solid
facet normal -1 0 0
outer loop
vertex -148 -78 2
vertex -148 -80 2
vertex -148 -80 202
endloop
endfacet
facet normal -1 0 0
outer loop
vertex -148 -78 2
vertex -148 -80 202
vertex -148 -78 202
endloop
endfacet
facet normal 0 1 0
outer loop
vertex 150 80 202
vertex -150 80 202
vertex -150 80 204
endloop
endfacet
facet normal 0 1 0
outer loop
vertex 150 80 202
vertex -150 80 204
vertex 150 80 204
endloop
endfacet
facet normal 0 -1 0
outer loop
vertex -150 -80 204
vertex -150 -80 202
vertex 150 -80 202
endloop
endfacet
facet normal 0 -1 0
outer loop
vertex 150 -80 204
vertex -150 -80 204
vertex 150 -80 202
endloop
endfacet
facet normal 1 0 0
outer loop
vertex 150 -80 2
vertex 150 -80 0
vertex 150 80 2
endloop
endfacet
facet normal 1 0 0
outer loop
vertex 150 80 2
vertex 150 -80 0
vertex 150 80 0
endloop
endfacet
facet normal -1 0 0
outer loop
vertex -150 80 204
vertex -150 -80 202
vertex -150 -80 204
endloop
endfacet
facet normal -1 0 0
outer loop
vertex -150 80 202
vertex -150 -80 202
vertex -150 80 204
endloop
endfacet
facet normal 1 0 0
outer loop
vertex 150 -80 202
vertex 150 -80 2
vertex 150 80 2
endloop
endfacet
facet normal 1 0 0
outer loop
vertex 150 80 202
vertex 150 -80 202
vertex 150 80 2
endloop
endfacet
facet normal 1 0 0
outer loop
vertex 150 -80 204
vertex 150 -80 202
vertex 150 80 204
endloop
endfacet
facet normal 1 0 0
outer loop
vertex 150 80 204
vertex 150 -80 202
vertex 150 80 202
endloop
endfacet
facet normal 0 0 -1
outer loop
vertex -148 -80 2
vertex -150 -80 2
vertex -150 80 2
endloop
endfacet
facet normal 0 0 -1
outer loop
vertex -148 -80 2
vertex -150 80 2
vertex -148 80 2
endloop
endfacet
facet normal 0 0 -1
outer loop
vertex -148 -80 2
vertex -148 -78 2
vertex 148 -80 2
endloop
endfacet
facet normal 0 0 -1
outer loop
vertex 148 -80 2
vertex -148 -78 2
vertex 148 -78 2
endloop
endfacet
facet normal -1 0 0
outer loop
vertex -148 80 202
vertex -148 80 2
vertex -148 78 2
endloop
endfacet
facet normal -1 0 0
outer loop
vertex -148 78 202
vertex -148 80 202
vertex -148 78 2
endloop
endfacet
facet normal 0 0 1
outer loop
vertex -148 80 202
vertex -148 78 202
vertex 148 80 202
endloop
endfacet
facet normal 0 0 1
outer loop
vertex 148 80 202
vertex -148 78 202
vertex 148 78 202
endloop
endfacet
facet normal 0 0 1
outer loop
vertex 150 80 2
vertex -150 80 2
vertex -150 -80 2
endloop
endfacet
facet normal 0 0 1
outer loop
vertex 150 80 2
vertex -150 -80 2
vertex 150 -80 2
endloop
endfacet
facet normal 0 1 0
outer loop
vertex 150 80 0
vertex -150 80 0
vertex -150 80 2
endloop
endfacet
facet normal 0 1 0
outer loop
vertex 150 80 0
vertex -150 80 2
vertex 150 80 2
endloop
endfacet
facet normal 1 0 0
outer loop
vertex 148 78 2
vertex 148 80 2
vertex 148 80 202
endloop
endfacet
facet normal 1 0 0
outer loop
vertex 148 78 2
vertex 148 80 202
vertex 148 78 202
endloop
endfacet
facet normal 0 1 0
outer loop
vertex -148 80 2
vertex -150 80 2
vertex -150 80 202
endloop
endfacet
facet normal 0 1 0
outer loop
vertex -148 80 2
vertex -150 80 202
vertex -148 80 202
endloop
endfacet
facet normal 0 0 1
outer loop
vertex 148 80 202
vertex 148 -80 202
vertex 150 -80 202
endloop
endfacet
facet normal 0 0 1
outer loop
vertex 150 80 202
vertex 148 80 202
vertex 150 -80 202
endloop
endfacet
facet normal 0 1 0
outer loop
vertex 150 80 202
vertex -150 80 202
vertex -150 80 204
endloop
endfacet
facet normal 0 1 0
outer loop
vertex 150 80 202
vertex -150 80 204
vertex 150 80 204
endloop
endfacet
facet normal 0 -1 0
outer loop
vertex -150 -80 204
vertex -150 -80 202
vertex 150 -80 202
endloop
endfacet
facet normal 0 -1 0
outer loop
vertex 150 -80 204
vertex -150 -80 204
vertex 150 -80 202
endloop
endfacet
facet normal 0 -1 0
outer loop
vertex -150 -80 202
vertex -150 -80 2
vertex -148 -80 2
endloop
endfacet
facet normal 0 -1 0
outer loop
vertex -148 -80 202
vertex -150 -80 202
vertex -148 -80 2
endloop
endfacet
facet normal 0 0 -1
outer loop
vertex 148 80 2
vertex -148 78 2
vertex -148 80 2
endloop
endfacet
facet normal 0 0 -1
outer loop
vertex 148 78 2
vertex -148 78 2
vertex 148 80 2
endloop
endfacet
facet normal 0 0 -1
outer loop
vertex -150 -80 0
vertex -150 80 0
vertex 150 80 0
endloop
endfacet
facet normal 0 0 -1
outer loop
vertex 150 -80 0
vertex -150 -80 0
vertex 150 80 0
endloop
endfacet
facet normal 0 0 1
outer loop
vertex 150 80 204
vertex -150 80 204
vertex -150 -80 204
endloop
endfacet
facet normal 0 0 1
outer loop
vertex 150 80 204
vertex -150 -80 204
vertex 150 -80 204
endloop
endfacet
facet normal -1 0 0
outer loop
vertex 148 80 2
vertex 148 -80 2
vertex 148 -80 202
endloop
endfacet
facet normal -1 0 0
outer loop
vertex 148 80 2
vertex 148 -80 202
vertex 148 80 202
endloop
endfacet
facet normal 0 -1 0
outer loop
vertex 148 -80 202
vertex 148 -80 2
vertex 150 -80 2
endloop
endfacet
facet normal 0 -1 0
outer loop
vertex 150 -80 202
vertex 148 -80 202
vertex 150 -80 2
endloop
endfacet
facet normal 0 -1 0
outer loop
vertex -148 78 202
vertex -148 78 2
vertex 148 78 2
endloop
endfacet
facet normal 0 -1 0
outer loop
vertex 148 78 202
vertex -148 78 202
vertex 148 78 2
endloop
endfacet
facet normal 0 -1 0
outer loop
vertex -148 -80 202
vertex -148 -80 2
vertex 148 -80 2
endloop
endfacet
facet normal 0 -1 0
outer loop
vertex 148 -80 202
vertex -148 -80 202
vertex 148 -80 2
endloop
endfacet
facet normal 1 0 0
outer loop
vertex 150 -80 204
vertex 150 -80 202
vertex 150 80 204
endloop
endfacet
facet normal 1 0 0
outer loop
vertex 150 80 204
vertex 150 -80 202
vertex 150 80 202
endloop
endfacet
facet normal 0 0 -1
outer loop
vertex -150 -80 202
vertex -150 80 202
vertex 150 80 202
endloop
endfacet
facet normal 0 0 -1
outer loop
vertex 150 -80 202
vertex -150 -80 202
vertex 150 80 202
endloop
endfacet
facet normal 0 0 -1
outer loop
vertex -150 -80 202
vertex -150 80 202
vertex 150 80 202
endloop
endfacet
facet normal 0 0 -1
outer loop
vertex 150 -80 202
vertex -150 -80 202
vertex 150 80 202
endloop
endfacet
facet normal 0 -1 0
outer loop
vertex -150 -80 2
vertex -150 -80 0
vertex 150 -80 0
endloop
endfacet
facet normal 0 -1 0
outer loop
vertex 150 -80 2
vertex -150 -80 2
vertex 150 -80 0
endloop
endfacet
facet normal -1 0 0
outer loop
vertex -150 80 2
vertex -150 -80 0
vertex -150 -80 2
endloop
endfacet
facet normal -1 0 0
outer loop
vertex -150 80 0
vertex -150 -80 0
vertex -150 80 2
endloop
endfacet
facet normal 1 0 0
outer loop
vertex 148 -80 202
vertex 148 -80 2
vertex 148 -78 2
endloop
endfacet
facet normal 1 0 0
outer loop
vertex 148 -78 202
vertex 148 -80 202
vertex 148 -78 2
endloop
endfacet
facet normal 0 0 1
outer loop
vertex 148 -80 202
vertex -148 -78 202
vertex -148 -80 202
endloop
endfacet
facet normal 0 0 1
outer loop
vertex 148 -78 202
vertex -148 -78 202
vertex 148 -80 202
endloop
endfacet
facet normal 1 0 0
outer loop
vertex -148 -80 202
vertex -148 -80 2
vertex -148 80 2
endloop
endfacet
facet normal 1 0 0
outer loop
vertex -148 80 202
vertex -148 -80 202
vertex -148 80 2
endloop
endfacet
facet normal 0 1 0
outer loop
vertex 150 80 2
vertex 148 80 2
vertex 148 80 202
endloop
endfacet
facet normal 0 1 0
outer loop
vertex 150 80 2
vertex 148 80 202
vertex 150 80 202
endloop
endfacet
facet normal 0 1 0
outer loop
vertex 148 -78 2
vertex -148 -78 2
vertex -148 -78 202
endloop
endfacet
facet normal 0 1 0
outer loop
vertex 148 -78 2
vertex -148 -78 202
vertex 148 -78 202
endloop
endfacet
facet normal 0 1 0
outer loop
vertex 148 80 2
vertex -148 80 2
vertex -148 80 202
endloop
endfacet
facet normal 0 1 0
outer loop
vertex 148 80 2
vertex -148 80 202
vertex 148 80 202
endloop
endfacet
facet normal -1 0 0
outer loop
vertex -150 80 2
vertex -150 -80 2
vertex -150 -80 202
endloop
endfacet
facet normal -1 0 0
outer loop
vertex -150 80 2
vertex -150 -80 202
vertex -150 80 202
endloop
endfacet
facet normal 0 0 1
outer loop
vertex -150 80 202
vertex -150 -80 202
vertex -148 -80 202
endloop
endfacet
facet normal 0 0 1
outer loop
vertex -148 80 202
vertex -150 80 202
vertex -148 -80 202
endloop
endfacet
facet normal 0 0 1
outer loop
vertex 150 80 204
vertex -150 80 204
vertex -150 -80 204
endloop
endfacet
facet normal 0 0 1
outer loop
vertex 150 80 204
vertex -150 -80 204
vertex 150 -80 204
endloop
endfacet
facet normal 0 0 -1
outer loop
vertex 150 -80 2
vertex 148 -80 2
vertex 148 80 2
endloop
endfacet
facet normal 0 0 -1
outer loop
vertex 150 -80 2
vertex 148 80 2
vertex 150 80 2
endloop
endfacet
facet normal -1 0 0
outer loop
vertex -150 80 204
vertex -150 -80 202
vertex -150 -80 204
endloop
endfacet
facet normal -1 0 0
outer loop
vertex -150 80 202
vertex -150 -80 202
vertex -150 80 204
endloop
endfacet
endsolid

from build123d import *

# Parameters (mm, degrees)
F0_W      = 300
F0_H      = 160
F1_DEPTH  = 2
F2_W      = 2
F2_H      = 160
F3_DEPTH  = 200
F4_W      = 2
F4_H      = 160
F5_DEPTH  = 200
F6_W      = 300
F6_H      = 160
F7_DEPTH  = 2
F8_W      = 296
F8_H      = 2
F9_DEPTH  = 200
F11_W     = 300
F11_H     = 160
F12_DEPTH = 2


with BuildPart() as f1:
    # F0 (on Top) → F1 (new body)
    with BuildSketch(Plane.XY):
        Rectangle(F0_W, F0_H)
    extrude(amount=F1_DEPTH)


with BuildPart() as f3:
    # F2 (on face) → F3 (new body)
    with BuildSketch(Plane.XY.offset(2)):
        with Locations((-149, 0)):
            Rectangle(F2_W, F2_H)
    extrude(amount=F3_DEPTH)


with BuildPart() as f5:
    # F4 (on face) → F5 (new body)
    with BuildSketch(Plane.XY.offset(2)):
        with Locations((149, 0)):
            Rectangle(F4_W, F4_H)
    extrude(amount=F5_DEPTH)


with BuildPart() as f7:
    # F6 (on face) → F7 (new body)
    with BuildSketch(Plane.XY.offset(202)):
        Rectangle(F6_W, F6_H)
    extrude(amount=F7_DEPTH)


with BuildPart() as f9:
    # F8 (on face) → F9 (new body)
    with BuildSketch(Plane.XY.offset(2)):
        with Locations((0, -79)):
            Rectangle(F8_W, F8_H)
    extrude(amount=F9_DEPTH)


with BuildPart() as f10_1:
    # F10: instance of F9
    add(f9.part.mirror(Plane.XZ))


with BuildPart() as f12:
    # F11 (on face) → F12 (new body)
    with BuildSketch(Plane.XY.offset(202)):
        Rectangle(F11_W, F11_H)
    extrude(amount=F12_DEPTH)


solid = Compound([f1.part, f3.part, f5.part, f7.part, f9.part, f10_1.part, f12.part])
